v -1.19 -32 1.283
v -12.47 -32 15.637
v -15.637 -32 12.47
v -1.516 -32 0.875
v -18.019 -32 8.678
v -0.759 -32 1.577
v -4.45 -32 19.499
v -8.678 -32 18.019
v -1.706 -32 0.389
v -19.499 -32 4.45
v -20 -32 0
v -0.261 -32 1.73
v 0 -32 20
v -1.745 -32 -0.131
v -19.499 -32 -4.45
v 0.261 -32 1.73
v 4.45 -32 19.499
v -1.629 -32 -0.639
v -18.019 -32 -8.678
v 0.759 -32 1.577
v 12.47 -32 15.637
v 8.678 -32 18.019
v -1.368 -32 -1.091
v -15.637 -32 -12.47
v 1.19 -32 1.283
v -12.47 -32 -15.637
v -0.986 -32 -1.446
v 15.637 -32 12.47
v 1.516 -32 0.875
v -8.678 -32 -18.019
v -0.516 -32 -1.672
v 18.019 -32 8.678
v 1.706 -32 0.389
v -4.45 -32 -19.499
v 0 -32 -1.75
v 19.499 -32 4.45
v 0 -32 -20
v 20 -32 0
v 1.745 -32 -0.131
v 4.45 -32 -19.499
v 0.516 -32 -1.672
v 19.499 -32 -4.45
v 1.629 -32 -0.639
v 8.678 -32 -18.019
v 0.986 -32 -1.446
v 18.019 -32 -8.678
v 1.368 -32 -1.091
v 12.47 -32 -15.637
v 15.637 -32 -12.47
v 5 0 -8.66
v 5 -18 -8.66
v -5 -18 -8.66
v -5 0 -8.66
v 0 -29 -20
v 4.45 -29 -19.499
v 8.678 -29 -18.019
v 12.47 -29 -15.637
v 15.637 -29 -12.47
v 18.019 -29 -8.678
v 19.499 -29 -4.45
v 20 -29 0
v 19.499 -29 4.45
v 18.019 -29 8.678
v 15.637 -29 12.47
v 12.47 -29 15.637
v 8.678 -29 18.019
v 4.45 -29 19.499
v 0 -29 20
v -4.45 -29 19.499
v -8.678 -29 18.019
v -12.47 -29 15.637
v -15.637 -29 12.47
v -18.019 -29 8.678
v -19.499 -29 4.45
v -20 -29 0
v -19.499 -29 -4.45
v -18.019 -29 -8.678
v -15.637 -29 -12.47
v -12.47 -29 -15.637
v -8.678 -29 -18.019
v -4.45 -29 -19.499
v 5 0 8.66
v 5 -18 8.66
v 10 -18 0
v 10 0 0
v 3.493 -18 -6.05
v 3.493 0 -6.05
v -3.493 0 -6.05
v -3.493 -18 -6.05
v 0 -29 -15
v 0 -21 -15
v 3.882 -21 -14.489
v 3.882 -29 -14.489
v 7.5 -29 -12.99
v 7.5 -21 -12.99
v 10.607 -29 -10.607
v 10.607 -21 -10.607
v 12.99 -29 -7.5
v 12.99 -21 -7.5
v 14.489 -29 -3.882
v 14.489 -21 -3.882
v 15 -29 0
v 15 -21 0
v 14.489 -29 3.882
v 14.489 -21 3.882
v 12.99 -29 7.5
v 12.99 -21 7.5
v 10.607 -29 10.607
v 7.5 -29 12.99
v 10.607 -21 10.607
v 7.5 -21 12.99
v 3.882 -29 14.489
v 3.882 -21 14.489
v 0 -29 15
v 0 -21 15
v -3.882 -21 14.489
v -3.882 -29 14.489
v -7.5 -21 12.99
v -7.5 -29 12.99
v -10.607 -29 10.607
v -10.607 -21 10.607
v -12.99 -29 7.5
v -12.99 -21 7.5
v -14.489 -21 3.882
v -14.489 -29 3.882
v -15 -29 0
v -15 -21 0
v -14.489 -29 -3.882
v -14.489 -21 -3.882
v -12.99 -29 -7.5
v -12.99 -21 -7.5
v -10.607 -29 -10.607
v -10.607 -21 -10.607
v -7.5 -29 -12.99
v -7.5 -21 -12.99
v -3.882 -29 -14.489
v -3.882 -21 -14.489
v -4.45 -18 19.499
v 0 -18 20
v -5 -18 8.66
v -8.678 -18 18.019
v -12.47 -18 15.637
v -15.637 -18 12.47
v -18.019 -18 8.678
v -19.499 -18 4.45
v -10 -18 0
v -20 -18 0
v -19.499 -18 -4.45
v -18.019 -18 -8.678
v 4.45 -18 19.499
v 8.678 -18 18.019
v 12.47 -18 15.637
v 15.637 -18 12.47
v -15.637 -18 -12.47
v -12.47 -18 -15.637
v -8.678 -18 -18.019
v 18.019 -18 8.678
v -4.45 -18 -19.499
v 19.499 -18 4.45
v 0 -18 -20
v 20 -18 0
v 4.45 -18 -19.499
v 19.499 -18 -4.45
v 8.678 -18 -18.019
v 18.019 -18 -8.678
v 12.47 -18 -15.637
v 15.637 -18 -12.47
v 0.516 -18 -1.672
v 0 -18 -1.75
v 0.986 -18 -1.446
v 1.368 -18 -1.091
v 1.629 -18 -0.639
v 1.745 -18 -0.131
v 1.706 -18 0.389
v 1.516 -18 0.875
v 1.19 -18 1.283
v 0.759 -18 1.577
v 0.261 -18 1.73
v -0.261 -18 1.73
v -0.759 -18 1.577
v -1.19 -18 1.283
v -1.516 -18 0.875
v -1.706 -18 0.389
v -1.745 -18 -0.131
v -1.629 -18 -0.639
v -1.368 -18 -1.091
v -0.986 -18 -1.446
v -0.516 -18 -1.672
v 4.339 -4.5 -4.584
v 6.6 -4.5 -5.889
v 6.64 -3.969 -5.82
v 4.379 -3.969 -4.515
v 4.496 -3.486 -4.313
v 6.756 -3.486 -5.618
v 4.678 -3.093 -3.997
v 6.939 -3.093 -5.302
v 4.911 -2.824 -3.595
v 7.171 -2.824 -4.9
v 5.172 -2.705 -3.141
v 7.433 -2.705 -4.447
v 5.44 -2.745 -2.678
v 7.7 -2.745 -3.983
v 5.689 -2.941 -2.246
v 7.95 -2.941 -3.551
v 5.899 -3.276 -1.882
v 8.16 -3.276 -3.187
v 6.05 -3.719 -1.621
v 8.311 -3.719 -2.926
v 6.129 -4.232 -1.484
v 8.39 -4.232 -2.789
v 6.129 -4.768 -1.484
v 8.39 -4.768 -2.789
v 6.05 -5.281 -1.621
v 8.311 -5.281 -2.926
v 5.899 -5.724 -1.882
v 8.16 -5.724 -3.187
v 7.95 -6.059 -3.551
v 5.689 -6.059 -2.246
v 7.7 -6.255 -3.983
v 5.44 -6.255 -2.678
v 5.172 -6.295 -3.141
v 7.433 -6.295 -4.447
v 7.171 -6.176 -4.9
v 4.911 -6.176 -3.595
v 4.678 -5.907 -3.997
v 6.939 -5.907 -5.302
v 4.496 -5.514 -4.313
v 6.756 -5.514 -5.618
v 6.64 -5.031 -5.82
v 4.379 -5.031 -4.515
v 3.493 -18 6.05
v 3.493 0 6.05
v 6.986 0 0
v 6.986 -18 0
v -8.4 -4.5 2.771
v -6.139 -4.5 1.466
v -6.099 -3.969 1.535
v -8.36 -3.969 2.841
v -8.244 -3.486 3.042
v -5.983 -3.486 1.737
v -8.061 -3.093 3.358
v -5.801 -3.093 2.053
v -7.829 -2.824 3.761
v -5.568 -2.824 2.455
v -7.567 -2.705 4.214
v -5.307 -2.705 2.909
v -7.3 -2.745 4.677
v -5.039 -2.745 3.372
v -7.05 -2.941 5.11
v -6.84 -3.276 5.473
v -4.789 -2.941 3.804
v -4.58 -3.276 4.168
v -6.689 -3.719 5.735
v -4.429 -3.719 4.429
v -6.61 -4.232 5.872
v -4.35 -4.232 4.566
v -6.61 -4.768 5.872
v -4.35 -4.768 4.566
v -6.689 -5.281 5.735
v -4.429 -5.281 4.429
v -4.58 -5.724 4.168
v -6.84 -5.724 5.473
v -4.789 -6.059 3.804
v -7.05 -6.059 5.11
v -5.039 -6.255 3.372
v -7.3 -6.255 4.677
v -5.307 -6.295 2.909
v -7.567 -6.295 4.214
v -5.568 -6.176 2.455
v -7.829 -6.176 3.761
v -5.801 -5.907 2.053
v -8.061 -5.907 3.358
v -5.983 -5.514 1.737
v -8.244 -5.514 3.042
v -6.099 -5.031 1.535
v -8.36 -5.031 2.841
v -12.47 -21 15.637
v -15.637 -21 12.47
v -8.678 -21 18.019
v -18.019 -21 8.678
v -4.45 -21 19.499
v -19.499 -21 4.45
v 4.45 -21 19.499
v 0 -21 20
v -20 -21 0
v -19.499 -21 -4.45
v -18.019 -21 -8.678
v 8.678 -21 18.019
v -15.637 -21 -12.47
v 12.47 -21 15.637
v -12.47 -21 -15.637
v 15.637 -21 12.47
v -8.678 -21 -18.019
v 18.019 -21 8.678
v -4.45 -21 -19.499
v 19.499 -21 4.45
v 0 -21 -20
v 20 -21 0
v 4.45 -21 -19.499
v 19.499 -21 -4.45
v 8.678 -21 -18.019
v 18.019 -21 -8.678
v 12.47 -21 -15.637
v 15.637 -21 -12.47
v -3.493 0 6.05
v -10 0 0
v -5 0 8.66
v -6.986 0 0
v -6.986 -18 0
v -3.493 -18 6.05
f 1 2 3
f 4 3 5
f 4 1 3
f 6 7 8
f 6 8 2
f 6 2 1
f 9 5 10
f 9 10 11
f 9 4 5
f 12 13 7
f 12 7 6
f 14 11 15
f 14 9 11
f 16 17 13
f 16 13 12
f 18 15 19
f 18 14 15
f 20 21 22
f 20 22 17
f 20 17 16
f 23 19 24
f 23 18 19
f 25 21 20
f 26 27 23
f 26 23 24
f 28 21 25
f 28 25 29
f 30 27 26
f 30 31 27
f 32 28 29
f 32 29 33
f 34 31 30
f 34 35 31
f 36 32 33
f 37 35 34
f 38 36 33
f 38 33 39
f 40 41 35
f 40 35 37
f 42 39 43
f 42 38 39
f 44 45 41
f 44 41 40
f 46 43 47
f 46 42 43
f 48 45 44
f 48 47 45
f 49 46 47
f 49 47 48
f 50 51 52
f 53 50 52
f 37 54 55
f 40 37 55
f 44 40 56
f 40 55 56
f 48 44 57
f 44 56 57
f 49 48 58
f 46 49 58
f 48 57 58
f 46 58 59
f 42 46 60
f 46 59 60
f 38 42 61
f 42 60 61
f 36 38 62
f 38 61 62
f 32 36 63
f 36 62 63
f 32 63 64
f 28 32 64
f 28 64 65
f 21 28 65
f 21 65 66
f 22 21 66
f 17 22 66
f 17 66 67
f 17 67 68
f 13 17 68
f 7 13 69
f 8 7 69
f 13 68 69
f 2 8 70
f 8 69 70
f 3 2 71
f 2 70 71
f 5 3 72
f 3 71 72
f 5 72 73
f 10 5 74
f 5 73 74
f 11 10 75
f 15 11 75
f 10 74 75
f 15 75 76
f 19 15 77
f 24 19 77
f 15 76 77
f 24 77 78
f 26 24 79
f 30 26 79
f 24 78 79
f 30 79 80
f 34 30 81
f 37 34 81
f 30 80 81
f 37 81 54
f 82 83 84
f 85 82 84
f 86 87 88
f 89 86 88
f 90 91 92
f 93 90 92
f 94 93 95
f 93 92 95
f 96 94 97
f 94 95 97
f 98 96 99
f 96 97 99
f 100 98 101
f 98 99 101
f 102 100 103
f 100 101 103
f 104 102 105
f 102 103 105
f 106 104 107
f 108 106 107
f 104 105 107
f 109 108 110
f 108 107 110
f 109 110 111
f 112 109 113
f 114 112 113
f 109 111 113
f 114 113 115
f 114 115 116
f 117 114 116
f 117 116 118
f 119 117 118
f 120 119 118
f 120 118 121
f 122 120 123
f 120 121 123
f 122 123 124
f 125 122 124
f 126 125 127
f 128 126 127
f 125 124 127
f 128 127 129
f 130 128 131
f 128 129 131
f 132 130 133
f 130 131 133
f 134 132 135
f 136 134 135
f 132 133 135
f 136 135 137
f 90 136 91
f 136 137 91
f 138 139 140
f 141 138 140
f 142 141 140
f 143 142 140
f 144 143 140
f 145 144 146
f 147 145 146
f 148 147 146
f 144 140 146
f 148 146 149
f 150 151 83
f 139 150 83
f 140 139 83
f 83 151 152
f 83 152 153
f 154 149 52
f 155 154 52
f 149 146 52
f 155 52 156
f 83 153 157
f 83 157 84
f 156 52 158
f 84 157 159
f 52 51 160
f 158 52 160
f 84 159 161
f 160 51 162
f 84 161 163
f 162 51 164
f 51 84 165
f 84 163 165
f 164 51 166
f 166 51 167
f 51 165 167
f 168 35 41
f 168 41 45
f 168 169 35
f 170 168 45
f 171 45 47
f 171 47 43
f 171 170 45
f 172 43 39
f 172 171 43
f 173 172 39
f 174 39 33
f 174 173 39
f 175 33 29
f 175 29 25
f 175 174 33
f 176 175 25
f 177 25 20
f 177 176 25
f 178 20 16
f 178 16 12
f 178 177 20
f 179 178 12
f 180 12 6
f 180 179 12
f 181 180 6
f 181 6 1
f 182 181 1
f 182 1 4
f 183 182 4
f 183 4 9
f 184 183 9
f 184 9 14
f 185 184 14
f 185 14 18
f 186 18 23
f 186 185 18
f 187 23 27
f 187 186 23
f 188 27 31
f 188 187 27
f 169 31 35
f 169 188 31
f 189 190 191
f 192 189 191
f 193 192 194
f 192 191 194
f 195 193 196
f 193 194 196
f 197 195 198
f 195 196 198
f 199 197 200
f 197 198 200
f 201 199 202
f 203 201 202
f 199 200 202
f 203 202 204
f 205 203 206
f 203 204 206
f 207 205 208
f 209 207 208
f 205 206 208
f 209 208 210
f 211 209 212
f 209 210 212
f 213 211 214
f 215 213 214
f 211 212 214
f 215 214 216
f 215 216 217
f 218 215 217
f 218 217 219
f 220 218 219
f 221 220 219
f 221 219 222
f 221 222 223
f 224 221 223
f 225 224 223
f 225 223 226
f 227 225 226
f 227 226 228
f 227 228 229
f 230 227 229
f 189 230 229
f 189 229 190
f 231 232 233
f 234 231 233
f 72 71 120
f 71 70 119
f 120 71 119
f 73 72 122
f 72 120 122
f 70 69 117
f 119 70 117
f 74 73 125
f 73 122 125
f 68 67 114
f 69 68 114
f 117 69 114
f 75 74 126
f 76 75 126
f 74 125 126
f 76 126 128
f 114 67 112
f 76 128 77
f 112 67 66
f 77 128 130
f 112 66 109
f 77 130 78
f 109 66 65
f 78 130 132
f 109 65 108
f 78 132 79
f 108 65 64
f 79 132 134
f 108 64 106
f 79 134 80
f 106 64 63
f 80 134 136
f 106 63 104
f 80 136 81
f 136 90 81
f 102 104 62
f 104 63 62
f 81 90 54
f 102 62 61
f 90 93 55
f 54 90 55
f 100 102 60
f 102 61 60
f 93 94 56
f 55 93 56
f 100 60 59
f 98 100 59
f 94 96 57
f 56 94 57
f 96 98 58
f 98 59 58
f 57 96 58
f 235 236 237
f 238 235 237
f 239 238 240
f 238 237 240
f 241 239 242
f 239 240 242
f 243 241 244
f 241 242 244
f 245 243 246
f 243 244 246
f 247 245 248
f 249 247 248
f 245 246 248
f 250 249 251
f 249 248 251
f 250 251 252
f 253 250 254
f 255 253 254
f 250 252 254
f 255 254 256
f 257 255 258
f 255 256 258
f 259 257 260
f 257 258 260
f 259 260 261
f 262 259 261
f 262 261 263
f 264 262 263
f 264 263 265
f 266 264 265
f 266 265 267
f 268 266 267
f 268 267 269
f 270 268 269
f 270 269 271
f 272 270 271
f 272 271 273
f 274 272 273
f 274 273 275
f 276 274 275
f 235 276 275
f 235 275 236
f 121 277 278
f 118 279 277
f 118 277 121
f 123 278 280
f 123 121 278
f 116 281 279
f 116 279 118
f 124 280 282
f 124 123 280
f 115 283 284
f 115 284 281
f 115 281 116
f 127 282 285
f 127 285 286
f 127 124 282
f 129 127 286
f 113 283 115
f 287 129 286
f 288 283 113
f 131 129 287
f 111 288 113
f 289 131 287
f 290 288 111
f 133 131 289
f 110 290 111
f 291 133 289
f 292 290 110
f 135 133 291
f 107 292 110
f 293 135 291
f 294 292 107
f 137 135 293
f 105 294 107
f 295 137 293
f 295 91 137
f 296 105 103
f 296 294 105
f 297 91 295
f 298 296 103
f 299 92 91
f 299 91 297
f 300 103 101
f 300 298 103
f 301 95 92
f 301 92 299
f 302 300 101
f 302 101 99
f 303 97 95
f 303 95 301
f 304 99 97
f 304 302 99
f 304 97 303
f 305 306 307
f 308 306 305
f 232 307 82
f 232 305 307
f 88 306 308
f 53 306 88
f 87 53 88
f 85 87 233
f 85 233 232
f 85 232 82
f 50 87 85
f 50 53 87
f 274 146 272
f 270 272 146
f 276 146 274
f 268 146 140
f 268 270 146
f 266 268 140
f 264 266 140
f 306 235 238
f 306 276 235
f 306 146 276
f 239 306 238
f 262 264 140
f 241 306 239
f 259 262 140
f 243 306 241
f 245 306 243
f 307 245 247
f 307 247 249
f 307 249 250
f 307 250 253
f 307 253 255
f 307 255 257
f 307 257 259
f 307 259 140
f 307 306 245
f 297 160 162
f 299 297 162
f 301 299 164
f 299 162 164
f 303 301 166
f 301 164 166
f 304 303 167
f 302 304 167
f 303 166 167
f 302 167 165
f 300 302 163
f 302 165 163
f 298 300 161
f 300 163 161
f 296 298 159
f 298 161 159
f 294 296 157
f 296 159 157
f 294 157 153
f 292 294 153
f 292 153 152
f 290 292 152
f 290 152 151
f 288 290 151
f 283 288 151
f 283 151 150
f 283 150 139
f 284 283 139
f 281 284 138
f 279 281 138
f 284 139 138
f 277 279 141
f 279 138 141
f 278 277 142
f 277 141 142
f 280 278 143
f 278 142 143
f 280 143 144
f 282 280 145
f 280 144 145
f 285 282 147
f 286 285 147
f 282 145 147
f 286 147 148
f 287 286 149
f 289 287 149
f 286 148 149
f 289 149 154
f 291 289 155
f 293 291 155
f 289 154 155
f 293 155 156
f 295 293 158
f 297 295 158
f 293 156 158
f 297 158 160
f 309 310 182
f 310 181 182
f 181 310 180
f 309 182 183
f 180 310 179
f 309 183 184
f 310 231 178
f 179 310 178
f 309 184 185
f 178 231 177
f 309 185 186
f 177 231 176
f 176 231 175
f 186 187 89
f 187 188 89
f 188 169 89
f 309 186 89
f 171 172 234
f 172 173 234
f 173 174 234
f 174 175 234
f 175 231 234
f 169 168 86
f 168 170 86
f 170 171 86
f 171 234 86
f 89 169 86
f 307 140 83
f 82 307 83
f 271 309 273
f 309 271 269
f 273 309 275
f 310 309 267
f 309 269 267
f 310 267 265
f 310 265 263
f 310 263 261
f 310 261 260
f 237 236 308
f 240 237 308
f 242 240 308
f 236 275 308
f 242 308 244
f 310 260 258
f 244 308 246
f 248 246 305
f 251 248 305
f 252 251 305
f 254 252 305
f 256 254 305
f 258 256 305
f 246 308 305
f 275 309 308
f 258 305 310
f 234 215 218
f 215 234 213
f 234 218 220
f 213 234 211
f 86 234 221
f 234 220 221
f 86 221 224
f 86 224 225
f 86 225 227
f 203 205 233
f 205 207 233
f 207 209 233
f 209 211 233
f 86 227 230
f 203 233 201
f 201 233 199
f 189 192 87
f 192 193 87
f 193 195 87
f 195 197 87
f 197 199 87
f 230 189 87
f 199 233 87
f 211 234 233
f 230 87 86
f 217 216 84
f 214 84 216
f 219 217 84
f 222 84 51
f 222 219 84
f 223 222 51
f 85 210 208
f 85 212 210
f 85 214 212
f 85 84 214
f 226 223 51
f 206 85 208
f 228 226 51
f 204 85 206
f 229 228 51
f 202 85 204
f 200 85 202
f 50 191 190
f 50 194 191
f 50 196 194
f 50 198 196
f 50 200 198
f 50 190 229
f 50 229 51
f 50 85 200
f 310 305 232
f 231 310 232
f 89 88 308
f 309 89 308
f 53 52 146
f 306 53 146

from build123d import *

# Parameters (mm, degrees)
EXTRUDE_3_DEPTH     = 18
SKETCH_2_R          = 1.8
CUT_EXTRUDE_1_DEPTH = 17.325
SKETCH_4_R          = 20
SKETCH_4_R_2        = 1.75
EXTRUDE_4_DEPTH     = 3
SKETCH_5_R          = 15
SKETCH_5_R_2        = 1.75
EXTRUDE_5_DEPTH     = 8
SKETCH_6_R          = 20
SKETCH_6_R_2        = 1.75
EXTRUDE_6_DEPTH     = 3


with BuildPart() as part:
    # 草图1 → 凸台-拉伸3 (new body)
    with BuildSketch(Plane(origin=(0, 0, 0), x_dir=(1, 0, 0), z_dir=(0, 1, 0))):
        Polygon((10, 0), (5, 8.660254038), (-5, 8.660254038), (-10, 0), (-5, -8.660254038), (5, -8.660254038), align=None)
        Polygon((6.985938257, 0), (3.492969129, 6.05), (-3.492969129, 6.05), (-6.985938257, 0), (-3.492969129, -6.05), (3.492969129, -6.05), align=None, mode=Mode.SUBTRACT)
    extrude(amount=-EXTRUDE_3_DEPTH)

    # 草图2 → 切除-拉伸1 (cut)
    with BuildSketch(Plane(origin=(7.5, 0, -4.330127019), x_dir=(-0.5000000000000003, 0, -0.8660254037844386), z_dir=(0.8660254037844386, 0, -0.5000000000000003))):
        with Locations((0, -4.5)):
            Circle(SKETCH_2_R)
    extrude(amount=-CUT_EXTRUDE_1_DEPTH, mode=Mode.SUBTRACT)

    # 草图4 → 凸台-拉伸4 (add)
    with BuildSketch(Plane.XZ.offset(18)):
        with Locations(Location((0, 0, 0), (0, 0, 270))):
            Circle(SKETCH_4_R)
        with Locations(Location((0, 0, 0), (0, 0, 270))):
            Circle(SKETCH_4_R_2, mode=Mode.SUBTRACT)
    extrude(amount=EXTRUDE_4_DEPTH)

    # 草图5 → 凸台-拉伸5 (add)
    with BuildSketch(Plane.XZ.offset(21)):
        with Locations(Location((0, 0, 0), (0, 0, 270))):
            Circle(SKETCH_5_R)
        with Locations(Location((0, 0, 0), (0, 0, 270))):
            Circle(SKETCH_5_R_2, mode=Mode.SUBTRACT)
    extrude(amount=EXTRUDE_5_DEPTH)

    # 草图6 → 凸台-拉伸6 (add)
    with BuildSketch(Plane.XZ.offset(29)):
        with Locations(Location((0, 0, 0), (0, 0, 270))):
            Circle(SKETCH_6_R)
        with Locations(Location((0, 0, 0), (0, 0, 270))):
            Circle(SKETCH_6_R_2, mode=Mode.SUBTRACT)
    extrude(amount=EXTRUDE_6_DEPTH)


solid = part.part
